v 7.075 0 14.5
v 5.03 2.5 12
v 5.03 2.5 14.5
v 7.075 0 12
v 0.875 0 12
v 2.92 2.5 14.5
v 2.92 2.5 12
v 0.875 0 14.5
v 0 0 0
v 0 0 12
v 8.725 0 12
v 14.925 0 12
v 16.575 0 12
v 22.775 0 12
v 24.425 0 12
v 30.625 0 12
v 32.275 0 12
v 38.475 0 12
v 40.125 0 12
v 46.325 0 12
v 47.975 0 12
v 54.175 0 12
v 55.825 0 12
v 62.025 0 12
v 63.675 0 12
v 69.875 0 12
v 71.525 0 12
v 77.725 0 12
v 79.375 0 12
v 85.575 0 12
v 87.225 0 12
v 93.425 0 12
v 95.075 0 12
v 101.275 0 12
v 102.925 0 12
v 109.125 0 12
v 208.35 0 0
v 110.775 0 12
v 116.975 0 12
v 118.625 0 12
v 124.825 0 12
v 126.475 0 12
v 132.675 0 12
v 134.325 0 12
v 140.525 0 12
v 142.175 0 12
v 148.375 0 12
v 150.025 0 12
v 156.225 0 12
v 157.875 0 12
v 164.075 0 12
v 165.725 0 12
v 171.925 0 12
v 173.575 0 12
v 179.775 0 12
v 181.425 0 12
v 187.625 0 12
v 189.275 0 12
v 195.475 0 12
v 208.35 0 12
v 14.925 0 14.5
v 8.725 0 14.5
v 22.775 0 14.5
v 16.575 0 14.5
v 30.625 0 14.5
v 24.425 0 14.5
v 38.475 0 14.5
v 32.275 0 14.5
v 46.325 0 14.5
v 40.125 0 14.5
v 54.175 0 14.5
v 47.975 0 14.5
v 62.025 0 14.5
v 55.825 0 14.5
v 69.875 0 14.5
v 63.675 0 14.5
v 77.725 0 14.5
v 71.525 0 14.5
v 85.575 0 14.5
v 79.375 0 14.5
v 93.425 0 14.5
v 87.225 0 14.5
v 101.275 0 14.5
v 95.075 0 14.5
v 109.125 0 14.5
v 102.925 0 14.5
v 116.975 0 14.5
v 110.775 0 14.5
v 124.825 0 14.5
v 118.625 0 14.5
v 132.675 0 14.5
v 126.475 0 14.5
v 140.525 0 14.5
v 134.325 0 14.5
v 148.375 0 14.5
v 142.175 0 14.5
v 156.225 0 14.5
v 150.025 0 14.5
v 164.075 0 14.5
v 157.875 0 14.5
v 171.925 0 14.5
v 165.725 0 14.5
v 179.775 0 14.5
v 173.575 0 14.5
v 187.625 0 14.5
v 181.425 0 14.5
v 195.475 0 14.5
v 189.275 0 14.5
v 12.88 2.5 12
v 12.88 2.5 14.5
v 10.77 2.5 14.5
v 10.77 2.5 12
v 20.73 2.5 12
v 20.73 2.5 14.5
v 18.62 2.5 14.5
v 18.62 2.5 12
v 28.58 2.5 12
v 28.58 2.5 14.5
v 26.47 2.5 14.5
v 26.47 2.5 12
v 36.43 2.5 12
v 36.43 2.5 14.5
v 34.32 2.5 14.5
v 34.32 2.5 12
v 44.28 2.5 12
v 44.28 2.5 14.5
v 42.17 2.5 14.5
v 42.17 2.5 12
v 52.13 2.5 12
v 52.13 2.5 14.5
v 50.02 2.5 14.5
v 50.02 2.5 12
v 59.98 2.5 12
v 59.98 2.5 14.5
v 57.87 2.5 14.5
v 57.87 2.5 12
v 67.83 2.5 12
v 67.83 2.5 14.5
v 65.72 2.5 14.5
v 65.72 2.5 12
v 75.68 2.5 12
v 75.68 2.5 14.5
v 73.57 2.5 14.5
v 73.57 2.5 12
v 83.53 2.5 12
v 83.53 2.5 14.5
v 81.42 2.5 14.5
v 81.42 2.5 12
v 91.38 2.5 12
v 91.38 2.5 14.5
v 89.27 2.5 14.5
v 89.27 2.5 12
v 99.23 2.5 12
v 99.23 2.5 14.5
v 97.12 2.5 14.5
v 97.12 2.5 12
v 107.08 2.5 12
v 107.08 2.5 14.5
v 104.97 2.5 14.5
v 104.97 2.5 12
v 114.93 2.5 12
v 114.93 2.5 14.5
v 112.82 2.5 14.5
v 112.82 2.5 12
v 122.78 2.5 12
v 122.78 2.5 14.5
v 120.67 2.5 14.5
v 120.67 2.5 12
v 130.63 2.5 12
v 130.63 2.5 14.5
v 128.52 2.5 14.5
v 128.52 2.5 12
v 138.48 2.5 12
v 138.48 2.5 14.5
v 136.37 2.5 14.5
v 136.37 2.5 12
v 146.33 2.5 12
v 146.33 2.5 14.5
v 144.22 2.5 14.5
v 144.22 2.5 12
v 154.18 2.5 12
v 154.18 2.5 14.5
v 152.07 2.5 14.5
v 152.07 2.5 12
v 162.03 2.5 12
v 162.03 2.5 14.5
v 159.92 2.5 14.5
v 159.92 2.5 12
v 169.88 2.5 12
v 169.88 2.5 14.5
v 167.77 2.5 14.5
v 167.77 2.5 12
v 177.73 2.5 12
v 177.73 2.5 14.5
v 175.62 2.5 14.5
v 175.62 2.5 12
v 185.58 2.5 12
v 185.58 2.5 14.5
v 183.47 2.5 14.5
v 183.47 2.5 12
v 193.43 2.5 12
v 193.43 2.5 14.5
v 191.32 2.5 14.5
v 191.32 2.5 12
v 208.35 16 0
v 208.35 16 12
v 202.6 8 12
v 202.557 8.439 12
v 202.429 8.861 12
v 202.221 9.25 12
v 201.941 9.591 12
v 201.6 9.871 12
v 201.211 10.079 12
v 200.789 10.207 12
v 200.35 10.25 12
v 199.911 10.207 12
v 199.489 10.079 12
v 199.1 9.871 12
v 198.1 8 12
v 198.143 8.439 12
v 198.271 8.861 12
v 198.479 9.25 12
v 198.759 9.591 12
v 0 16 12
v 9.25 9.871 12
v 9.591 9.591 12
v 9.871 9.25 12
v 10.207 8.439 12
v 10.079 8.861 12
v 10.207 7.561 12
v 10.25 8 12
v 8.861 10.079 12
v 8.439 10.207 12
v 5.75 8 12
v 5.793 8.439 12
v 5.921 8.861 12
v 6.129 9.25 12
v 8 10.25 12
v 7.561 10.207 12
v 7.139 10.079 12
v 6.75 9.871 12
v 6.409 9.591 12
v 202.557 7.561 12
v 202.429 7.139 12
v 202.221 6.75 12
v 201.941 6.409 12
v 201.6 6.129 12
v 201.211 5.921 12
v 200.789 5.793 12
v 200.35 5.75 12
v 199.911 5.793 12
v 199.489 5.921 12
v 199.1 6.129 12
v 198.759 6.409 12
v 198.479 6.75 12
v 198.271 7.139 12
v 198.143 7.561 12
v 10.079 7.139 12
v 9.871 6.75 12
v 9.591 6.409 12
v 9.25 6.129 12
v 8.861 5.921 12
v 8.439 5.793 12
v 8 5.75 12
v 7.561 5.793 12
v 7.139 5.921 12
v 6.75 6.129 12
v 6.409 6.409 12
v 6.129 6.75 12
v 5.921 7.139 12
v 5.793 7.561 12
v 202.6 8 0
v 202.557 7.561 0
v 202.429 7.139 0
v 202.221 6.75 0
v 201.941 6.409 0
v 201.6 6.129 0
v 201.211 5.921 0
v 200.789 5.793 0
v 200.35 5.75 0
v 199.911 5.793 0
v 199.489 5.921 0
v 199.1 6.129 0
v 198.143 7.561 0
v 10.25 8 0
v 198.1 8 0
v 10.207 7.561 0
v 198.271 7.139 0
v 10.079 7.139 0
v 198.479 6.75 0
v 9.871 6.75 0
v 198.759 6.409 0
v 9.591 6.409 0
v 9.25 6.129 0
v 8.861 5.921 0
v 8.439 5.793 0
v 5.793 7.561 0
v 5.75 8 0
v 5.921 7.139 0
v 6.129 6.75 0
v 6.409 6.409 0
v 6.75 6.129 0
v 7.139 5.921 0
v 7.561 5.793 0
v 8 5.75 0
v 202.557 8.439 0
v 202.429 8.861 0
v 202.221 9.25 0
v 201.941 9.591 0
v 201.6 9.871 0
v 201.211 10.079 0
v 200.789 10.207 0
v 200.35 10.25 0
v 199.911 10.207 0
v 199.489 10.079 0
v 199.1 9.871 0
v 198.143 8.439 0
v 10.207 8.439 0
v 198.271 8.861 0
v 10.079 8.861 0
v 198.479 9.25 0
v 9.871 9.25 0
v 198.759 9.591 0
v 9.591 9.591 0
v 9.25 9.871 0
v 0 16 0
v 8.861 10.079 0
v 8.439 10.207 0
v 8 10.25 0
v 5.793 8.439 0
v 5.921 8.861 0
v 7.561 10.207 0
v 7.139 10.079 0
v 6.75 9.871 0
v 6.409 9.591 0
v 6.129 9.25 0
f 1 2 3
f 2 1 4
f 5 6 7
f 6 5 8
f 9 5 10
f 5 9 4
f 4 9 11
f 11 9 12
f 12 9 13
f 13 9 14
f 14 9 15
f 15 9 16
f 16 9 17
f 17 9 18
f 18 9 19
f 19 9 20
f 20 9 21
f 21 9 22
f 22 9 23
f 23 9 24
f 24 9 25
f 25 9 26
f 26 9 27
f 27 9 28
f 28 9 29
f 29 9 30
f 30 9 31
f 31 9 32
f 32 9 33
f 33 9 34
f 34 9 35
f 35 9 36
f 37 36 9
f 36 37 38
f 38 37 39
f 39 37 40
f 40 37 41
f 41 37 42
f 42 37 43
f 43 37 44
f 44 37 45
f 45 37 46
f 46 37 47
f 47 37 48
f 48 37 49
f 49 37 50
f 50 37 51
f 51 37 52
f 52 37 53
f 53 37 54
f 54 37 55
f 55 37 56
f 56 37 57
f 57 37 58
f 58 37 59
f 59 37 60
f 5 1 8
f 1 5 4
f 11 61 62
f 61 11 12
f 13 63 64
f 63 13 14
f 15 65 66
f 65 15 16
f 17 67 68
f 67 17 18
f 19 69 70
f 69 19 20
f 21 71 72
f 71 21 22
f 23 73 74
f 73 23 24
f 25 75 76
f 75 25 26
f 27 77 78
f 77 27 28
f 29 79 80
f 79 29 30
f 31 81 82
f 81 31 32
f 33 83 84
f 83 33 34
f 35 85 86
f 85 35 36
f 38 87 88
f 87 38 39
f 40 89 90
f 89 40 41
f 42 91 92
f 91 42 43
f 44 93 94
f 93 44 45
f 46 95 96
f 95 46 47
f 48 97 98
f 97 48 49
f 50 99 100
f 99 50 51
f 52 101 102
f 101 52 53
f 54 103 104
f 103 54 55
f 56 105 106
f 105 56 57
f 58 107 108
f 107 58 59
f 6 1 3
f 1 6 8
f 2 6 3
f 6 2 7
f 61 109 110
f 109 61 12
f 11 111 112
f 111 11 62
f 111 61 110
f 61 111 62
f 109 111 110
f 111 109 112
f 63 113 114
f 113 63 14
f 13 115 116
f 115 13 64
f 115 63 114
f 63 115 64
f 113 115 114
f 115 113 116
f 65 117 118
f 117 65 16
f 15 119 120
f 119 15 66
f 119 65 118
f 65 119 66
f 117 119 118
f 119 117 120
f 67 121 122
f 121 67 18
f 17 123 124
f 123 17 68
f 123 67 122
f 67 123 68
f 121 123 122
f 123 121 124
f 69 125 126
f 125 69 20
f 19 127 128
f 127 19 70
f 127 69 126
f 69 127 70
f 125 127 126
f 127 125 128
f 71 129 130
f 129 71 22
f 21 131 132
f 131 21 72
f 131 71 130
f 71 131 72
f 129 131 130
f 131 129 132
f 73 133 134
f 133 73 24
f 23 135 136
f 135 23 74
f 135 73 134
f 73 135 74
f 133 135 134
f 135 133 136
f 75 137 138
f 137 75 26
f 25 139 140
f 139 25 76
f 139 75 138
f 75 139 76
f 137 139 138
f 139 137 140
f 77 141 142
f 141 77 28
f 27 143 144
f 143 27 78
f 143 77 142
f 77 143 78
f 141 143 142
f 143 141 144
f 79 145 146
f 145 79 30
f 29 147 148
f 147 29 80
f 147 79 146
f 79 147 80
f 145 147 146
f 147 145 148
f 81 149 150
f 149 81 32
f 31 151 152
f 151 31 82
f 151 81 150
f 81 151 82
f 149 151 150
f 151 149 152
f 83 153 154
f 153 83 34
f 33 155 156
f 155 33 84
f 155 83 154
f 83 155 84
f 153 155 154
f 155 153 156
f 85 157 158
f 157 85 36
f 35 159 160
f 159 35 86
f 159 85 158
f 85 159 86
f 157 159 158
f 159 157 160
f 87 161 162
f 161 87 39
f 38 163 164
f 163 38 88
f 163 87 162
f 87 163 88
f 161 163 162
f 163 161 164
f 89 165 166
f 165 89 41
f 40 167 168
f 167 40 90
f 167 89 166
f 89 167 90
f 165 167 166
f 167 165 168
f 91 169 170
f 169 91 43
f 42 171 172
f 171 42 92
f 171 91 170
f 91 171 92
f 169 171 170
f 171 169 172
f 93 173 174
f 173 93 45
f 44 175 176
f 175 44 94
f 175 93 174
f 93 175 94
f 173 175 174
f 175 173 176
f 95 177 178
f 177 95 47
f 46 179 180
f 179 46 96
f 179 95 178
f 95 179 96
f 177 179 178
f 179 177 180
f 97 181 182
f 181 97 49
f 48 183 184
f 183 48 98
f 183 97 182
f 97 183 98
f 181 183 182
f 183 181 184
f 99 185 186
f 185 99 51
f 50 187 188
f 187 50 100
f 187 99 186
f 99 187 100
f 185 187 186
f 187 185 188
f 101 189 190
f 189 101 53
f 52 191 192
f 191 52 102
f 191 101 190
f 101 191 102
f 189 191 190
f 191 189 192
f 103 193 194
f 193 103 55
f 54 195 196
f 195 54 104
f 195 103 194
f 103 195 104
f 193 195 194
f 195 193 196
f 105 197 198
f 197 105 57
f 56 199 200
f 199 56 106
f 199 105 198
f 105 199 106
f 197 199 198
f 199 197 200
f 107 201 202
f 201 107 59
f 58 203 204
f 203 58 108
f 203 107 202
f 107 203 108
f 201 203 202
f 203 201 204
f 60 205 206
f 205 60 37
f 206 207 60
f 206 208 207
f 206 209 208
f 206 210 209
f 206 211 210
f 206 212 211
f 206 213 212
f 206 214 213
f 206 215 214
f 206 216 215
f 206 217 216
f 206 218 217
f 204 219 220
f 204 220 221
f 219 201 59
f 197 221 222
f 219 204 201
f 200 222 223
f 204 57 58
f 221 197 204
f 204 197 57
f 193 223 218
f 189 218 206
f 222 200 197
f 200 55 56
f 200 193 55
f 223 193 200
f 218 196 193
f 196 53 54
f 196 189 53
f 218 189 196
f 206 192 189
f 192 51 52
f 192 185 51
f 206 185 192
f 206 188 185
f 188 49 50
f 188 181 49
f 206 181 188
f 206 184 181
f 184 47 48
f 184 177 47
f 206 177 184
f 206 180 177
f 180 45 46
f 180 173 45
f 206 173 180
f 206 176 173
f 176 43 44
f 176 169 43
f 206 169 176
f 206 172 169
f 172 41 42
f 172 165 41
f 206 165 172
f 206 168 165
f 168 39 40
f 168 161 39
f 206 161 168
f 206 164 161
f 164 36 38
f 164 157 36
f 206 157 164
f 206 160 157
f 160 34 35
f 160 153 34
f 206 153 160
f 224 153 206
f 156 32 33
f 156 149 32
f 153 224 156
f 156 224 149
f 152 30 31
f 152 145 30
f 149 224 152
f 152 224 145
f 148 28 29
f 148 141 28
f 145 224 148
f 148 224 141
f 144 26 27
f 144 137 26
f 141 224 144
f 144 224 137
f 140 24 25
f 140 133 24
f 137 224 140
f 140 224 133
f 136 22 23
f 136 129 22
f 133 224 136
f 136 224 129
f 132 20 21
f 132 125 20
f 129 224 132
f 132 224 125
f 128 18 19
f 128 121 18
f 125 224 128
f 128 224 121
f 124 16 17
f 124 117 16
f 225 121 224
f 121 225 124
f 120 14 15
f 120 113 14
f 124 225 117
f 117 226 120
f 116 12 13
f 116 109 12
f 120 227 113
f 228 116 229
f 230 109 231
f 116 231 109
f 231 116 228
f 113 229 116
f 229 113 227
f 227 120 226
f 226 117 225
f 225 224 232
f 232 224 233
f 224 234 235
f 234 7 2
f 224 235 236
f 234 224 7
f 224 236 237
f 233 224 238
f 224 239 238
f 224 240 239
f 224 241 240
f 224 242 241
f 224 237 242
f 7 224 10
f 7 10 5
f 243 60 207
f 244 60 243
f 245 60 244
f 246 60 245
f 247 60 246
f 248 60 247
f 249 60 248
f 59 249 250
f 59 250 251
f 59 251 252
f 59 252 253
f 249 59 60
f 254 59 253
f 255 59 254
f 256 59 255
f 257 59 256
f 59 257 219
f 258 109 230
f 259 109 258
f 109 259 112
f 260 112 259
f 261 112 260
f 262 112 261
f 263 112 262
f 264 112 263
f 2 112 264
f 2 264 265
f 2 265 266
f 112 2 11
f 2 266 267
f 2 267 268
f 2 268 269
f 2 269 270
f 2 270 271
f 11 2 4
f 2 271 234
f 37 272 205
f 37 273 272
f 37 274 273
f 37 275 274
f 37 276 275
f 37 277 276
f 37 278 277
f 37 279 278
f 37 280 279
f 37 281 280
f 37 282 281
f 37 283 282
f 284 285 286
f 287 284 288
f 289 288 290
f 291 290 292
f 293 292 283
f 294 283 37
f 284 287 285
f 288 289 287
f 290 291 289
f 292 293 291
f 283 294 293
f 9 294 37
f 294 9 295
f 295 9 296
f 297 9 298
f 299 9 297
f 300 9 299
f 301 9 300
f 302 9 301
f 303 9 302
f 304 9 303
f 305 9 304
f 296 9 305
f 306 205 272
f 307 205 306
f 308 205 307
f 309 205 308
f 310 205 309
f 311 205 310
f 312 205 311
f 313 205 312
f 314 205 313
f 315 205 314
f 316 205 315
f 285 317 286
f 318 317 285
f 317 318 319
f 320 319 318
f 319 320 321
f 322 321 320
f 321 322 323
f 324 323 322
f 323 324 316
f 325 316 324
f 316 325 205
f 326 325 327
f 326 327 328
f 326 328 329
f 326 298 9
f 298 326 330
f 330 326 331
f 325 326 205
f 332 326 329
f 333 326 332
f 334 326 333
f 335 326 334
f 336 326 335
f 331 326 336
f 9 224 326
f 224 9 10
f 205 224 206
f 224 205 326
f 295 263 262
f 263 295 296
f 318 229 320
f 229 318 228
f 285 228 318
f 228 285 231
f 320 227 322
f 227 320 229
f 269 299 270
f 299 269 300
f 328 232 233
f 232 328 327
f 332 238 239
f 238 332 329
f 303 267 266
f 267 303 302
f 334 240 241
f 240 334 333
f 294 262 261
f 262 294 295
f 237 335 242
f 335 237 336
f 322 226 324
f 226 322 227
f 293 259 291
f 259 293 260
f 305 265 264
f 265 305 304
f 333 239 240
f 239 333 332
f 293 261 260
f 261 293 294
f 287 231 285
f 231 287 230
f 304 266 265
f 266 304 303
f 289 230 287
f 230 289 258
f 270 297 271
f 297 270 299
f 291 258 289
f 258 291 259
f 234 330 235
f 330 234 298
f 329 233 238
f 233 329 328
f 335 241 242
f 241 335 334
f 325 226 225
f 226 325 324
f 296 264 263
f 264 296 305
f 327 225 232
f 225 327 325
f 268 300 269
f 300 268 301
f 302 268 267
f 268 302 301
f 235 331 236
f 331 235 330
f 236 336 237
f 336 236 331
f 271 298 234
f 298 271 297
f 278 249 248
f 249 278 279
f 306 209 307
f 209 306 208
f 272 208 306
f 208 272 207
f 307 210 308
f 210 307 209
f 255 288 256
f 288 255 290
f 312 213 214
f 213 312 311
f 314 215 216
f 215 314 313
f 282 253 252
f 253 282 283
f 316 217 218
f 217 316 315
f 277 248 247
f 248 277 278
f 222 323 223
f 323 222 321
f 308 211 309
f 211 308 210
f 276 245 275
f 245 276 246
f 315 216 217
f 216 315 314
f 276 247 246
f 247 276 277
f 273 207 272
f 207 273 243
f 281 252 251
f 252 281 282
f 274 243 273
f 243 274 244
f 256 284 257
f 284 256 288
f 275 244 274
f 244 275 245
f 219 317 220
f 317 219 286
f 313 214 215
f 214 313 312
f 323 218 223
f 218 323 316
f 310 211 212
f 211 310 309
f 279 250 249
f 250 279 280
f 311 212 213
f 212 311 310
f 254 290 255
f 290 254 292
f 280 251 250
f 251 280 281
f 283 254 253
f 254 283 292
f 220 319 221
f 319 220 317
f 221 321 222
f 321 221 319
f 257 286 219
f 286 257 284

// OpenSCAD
$fn = 32;

// ----------------------------------------------------------------------
// Gear rack: m=2.5 z=25, 208.35 x 16 x 14.5 mm
// ----------------------------------------------------------------------

// --- parameters (mm) ---
length = 208.35;          // rack length, X
width = 16;               // rack width, Y
height = 14.5;            // overall height, Z
module_m = 2.5;           // module
back_t = 12;              // tooth root line height
pitch = 7.85;             // circular pitch
tip_w = 2.11;             // tooth thickness at the tip
root_w = 6.2;             // tooth thickness at the root line
hole_d = 4.5;             // mounting hole
sink = 0.6;               // tooth root overlap into the body

tooth_span = 196.35;

module tooth(x0) {
  /* 20 deg flank profile, sunk into the body for a positive overlap */
  translate([x0, 0, back_t - sink])
    linear_extrude(height = height - back_t + sink)
      polygon(points = [[-root_w / 2, 0], [root_w / 2, 0],
                        [tip_w / 2, height - back_t],
                        [-tip_w / 2, height - back_t]]);
}

difference() {
  union() {
    cube([length, width, back_t]);
    for (i = [0 : 25 - 1])
      tooth((i + 0.5) * pitch + (tooth_span - 25 * pitch) / 2);
  }
  translate([8, 8, -1]) cylinder(h = back_t + 2, d = hole_d);
  translate([200.35, 8, -1]) cylinder(h = back_t + 2, d = hole_d);
}
